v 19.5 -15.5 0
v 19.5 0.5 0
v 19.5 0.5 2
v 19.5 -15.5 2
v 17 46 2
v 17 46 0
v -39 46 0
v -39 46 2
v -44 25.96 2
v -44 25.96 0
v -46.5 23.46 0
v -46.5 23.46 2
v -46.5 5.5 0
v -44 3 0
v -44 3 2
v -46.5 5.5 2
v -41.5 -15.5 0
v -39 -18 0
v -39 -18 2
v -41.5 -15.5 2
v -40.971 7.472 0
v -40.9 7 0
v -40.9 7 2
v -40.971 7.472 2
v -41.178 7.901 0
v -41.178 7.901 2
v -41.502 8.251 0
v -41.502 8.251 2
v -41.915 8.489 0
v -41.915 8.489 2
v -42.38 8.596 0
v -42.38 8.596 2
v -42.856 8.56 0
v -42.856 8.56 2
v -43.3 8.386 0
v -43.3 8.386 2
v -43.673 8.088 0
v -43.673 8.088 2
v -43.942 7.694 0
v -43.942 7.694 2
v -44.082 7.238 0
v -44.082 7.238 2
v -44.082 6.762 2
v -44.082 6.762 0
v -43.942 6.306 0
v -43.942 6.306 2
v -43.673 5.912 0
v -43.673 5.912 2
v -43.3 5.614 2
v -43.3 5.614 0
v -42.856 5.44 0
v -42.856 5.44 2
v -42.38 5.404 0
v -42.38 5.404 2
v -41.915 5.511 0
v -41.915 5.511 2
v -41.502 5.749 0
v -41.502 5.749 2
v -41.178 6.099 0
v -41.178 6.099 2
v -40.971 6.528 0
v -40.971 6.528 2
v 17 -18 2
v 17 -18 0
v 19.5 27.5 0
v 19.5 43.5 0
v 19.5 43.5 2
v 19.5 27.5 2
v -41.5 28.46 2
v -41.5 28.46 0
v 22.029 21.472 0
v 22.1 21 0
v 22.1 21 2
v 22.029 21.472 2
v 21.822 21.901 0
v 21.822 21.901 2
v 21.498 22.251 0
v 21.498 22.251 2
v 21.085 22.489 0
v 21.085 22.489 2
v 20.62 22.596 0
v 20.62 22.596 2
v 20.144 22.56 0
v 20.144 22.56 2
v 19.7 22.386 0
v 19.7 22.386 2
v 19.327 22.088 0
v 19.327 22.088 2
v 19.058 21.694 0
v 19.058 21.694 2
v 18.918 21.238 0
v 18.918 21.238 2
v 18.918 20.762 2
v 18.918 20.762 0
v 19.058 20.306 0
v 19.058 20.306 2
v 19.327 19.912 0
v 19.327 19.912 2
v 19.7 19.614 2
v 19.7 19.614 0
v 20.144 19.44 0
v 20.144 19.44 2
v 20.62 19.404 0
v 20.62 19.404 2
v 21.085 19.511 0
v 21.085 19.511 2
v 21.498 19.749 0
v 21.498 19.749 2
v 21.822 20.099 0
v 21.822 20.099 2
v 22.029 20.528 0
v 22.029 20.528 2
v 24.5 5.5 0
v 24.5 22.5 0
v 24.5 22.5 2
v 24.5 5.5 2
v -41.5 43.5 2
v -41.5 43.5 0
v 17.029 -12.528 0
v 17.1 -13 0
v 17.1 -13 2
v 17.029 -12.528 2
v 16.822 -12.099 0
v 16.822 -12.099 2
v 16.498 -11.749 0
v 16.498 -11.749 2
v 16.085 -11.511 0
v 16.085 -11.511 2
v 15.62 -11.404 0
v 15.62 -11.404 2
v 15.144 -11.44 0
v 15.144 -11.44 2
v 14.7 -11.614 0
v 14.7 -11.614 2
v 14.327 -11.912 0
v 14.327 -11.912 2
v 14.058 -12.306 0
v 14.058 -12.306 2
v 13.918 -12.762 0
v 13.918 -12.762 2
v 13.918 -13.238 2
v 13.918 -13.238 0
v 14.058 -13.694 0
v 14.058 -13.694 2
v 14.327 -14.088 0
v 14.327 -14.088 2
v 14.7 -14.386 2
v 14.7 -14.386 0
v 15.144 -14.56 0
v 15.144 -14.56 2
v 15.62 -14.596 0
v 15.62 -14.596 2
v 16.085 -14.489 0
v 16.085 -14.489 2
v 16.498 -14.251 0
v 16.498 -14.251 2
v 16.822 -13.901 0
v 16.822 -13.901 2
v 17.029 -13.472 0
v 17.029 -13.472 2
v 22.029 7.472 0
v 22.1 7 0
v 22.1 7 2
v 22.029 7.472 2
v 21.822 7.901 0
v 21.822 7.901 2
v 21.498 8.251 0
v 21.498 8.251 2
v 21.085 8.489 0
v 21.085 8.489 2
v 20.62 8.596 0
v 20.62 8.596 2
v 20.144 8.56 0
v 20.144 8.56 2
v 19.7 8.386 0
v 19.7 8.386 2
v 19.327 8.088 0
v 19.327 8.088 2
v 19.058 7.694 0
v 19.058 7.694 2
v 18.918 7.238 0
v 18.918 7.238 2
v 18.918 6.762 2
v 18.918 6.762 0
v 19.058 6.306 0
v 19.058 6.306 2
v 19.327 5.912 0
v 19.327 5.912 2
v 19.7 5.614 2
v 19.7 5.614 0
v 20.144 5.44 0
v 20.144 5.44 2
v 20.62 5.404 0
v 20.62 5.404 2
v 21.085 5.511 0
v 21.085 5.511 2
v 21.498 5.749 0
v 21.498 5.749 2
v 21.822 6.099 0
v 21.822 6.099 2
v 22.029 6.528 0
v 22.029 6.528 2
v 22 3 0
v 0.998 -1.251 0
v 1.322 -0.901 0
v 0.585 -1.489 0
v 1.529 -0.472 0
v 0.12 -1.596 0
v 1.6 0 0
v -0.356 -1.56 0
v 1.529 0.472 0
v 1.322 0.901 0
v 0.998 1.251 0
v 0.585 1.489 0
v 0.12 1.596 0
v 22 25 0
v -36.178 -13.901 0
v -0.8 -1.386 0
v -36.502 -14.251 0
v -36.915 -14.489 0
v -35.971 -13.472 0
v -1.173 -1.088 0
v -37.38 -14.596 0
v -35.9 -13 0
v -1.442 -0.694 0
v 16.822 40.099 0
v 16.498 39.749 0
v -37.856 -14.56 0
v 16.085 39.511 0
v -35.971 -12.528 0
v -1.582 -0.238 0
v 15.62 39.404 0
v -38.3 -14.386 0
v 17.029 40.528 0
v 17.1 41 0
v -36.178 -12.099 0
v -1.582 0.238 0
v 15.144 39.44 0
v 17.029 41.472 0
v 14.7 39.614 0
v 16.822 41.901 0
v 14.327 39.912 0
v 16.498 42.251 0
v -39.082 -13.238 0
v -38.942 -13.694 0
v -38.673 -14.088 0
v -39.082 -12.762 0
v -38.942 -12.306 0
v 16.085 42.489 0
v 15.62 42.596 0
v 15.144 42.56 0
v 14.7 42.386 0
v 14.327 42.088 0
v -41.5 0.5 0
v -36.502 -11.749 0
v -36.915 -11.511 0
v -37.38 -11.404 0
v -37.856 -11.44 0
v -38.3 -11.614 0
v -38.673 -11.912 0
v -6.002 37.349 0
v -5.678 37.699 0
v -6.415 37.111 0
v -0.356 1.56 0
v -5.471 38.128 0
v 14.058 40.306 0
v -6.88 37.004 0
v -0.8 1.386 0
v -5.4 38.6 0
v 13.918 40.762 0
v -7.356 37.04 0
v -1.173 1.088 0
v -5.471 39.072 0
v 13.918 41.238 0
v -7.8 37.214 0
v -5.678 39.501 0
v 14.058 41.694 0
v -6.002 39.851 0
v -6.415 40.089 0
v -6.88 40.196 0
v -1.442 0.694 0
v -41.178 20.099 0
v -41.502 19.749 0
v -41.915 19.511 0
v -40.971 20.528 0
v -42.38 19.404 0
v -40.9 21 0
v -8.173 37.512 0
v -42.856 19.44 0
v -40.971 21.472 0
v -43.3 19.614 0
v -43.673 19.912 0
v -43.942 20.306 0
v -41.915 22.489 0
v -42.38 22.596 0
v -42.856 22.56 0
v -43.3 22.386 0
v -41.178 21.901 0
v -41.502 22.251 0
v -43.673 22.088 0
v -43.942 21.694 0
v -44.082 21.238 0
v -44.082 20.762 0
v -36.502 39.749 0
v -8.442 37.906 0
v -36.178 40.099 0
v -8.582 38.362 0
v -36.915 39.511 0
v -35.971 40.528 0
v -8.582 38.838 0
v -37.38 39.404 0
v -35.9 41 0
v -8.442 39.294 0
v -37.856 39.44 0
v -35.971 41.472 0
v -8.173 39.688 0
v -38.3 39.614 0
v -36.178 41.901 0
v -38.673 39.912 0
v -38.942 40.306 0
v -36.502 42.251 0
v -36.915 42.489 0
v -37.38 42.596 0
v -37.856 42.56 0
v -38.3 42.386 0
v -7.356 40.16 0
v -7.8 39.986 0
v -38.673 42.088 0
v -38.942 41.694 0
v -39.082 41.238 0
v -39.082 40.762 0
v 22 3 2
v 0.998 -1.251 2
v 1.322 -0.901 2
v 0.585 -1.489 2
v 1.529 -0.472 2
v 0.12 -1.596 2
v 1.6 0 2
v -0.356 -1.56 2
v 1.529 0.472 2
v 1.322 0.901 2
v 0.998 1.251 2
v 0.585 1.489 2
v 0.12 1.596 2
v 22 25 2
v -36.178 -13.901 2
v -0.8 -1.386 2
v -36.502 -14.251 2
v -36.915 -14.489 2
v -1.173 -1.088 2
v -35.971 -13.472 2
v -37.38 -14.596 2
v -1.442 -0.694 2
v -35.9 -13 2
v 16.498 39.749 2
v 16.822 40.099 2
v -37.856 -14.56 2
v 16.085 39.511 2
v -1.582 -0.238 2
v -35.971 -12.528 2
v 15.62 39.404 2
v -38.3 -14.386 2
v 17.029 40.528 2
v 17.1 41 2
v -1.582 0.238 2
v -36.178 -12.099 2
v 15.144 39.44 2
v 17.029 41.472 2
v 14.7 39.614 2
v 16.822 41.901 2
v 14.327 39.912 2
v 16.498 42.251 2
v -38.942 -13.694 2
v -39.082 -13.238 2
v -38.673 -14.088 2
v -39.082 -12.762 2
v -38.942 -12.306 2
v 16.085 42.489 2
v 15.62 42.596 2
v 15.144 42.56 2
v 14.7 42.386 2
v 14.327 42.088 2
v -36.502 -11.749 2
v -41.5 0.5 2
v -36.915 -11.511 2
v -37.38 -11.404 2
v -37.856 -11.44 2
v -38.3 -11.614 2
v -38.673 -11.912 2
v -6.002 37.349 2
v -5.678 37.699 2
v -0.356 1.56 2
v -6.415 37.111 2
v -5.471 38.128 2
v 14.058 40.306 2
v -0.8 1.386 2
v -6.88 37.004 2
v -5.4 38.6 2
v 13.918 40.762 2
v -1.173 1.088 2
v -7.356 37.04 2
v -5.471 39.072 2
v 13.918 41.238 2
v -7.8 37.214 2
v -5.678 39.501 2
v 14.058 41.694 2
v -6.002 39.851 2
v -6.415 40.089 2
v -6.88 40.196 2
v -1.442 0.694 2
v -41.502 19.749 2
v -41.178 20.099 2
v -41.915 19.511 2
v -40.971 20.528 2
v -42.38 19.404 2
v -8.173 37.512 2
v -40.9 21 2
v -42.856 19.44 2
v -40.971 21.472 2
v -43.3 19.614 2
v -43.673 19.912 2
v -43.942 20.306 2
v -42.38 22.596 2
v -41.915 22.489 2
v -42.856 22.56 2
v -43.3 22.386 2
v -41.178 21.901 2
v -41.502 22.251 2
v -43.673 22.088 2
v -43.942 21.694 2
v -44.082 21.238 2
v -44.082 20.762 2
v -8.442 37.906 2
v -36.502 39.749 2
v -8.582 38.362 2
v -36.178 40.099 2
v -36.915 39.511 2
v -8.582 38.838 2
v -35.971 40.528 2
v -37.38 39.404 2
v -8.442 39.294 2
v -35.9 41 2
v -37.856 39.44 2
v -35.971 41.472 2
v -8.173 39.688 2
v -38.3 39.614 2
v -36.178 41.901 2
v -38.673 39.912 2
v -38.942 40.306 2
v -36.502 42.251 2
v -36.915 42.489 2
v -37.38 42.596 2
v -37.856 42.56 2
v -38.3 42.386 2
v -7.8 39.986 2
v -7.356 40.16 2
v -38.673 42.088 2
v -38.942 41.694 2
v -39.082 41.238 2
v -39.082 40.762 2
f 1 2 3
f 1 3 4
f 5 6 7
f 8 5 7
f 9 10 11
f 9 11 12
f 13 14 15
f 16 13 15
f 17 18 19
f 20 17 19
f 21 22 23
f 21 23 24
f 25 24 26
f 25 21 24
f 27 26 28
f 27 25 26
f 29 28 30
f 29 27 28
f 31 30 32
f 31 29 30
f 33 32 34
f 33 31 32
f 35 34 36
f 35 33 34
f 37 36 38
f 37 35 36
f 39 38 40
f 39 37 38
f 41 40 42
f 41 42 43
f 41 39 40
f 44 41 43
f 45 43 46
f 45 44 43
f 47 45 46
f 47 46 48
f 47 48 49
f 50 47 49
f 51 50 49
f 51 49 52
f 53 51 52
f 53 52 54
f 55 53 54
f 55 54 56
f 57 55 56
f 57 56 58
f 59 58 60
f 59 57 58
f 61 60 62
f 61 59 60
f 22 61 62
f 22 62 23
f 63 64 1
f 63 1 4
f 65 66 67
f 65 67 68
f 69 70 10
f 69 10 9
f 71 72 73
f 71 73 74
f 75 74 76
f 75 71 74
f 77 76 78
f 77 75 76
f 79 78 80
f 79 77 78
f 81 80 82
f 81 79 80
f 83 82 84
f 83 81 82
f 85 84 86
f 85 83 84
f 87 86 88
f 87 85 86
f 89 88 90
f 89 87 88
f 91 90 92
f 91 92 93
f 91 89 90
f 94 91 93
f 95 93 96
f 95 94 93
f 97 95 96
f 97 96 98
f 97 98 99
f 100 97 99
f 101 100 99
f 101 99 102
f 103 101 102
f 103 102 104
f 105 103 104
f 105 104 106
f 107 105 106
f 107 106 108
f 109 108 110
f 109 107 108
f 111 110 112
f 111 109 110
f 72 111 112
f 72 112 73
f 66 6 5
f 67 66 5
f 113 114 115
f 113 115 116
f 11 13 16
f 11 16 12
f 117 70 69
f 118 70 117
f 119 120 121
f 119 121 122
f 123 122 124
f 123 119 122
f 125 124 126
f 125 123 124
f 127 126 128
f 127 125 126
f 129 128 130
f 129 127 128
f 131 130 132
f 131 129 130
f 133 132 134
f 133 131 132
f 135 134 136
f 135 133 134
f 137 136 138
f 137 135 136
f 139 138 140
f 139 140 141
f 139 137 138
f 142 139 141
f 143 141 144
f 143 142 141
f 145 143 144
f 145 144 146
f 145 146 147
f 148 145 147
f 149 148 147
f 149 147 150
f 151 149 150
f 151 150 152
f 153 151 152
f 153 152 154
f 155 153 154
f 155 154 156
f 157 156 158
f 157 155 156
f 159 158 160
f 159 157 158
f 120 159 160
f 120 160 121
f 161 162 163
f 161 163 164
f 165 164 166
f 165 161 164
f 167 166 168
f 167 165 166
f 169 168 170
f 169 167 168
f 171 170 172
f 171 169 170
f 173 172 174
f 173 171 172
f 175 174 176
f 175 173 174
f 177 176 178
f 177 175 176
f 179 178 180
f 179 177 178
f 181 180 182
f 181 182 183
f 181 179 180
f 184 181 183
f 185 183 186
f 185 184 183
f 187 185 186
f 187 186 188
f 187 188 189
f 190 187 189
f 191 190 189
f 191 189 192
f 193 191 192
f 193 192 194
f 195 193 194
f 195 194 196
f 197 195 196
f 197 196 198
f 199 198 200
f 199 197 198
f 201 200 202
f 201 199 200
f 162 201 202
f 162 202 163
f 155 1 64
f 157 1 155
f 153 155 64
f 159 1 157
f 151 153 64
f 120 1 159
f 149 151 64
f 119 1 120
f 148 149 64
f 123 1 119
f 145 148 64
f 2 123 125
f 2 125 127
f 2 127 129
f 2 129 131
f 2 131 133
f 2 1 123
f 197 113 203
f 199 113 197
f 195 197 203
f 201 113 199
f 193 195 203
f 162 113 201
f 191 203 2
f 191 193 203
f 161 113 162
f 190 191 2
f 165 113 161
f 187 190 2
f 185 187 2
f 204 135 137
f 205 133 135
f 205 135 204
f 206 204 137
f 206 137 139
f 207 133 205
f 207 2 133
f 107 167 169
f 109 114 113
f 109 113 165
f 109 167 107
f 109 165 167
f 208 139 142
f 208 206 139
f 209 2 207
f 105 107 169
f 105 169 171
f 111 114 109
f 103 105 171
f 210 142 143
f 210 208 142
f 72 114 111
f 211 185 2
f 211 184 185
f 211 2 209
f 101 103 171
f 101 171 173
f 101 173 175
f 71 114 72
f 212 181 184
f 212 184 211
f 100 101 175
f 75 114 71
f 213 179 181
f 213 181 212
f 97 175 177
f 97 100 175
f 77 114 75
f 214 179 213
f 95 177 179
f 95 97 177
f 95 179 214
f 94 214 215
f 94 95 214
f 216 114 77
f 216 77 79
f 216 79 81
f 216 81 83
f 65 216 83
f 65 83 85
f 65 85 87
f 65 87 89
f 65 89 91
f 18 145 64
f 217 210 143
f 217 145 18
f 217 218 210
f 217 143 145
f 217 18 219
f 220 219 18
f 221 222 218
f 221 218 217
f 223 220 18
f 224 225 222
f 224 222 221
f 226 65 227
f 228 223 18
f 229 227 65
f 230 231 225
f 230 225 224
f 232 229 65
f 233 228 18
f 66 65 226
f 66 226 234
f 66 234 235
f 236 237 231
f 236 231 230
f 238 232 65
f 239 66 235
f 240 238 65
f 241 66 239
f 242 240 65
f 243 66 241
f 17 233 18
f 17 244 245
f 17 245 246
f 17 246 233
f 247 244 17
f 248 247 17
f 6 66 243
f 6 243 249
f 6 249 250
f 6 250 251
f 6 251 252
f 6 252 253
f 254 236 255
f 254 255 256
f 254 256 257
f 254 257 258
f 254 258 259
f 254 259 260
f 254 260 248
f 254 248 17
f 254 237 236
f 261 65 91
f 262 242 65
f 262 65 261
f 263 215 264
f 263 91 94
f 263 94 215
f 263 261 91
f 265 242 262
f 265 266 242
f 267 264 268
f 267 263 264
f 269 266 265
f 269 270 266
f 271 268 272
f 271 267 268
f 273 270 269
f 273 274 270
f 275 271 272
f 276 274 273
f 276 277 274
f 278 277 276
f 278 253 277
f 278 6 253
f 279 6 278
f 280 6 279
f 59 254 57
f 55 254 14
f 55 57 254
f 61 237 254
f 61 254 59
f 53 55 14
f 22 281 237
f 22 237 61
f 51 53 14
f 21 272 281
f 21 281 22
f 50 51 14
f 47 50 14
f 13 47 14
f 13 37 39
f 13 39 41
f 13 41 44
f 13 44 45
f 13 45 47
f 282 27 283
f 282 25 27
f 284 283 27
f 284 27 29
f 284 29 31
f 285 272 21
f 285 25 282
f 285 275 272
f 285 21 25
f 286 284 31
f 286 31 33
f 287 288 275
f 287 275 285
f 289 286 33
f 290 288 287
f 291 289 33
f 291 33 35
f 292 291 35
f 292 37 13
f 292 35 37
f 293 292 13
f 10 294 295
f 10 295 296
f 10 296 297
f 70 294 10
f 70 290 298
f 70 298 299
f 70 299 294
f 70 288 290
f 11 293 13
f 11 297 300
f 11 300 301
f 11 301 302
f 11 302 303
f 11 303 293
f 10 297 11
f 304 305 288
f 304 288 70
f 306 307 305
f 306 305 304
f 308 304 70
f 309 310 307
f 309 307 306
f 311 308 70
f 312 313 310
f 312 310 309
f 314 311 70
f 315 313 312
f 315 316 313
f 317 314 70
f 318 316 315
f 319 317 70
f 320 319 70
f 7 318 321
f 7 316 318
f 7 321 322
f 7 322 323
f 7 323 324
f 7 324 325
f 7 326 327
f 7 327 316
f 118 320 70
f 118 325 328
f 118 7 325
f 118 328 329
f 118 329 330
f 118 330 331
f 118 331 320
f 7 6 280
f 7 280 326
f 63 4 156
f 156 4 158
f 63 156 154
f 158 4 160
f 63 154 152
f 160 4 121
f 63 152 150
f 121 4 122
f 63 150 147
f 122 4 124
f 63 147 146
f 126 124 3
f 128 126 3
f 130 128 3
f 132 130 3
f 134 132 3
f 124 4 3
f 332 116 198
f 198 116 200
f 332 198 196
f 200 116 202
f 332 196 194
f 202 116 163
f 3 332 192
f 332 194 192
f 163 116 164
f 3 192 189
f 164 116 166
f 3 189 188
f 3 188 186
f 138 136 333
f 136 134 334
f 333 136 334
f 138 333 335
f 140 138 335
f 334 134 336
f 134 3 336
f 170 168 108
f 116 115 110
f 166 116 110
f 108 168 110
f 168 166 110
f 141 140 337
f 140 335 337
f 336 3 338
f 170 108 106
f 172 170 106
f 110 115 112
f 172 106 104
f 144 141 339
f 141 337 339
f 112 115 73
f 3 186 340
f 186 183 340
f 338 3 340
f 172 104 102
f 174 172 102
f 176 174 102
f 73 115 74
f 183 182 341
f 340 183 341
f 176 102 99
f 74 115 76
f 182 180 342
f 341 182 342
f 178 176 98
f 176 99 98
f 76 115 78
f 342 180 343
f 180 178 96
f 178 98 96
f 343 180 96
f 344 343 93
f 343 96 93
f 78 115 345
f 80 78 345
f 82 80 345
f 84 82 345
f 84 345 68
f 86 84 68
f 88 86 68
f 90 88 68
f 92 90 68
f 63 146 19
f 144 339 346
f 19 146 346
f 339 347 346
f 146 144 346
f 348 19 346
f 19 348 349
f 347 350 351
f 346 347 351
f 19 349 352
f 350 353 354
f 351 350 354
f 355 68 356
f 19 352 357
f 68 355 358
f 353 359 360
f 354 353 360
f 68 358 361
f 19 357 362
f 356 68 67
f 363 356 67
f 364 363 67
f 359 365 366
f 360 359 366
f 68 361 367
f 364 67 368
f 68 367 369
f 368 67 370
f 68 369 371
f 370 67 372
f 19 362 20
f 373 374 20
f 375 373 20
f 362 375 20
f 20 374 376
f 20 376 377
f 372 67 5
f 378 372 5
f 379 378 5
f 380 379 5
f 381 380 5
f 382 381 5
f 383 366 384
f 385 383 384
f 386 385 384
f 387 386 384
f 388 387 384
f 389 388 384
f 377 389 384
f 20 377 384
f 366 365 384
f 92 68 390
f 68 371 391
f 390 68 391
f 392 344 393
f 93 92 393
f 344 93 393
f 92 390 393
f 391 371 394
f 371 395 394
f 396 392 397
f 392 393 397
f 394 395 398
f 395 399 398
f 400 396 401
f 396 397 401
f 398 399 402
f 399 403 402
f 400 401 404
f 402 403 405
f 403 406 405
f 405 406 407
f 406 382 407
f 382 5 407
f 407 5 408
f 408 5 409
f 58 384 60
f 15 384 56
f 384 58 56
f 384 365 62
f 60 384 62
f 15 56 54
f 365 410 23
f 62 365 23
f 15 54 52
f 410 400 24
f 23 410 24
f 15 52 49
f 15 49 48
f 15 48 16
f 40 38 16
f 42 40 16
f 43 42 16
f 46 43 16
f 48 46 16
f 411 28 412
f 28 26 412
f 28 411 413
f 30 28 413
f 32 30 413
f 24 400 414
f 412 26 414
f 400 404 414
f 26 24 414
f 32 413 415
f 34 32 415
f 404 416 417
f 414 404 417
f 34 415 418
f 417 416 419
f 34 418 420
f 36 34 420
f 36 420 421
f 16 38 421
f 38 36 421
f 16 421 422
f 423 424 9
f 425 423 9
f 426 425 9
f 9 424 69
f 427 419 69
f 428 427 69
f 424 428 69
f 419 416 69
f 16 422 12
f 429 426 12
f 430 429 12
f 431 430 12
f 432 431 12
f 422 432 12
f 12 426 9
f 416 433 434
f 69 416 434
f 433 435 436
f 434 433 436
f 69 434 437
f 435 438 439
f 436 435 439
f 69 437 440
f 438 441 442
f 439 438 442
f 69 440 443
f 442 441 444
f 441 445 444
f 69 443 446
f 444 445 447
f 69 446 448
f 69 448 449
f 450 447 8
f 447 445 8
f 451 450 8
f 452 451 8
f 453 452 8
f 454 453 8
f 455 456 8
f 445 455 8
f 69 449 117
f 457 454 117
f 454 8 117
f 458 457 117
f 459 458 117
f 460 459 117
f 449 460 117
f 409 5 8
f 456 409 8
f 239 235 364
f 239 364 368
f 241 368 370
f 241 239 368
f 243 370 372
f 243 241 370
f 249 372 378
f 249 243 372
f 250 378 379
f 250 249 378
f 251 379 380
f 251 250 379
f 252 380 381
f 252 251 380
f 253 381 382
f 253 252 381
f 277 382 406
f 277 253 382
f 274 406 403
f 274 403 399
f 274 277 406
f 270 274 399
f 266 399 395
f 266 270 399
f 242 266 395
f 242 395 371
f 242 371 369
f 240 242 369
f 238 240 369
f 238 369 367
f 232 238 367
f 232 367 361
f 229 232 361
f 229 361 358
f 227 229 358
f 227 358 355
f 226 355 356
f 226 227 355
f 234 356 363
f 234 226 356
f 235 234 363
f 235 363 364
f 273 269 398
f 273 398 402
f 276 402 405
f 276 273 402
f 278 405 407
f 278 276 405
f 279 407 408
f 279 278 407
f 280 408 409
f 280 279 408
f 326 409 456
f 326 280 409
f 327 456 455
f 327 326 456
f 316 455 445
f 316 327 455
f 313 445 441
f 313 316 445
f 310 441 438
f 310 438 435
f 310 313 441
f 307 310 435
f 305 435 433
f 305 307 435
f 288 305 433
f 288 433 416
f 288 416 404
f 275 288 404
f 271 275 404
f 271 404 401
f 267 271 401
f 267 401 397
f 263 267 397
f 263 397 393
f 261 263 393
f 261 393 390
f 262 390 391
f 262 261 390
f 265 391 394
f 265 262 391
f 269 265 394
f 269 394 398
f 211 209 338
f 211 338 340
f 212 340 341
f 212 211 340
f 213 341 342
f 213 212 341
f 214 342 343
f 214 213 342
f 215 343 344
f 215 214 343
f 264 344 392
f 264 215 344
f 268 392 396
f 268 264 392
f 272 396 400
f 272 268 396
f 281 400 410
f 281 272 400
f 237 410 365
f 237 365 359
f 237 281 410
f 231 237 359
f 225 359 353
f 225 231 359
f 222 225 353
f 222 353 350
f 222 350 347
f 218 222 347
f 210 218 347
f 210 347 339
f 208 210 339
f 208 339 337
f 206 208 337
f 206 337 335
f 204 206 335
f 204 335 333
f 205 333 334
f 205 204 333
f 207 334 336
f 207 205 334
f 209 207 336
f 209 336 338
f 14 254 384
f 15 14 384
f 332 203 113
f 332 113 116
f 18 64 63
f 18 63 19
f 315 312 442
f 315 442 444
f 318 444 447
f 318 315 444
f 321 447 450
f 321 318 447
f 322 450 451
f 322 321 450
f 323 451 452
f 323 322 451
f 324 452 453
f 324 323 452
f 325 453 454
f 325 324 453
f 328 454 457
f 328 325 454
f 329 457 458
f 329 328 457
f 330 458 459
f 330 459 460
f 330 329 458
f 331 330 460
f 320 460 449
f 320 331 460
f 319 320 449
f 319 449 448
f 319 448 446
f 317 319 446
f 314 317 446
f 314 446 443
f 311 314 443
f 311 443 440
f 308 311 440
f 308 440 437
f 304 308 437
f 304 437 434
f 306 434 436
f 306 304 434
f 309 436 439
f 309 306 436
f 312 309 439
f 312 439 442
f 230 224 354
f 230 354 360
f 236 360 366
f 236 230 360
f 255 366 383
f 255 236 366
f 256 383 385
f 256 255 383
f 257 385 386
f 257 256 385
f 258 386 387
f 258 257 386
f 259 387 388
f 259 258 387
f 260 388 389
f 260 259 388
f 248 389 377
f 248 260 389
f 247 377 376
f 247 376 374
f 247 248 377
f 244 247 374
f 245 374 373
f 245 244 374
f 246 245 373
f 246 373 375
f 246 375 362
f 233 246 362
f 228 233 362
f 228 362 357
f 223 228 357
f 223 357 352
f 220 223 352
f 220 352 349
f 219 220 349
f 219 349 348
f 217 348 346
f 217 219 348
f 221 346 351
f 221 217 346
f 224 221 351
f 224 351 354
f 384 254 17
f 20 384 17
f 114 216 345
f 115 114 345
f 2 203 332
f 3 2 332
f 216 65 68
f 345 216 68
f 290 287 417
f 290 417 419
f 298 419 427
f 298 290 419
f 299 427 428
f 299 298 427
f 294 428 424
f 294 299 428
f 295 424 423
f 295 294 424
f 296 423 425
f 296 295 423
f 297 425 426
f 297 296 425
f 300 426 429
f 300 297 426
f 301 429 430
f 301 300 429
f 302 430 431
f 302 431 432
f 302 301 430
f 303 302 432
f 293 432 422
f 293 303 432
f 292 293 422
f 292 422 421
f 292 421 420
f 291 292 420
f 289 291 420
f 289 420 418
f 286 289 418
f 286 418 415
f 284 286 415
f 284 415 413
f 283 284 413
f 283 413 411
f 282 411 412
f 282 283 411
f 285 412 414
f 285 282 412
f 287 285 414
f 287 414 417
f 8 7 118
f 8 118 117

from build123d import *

# Parameters (mm, degrees)
SKETCH_1_W      = 38
SKETCH_1_H      = 54
SKETCH_1_R      = 1.6
EXTRUDE_1_DEPTH = 2
SKETCH_4_R      = 1.6
EXTRUDE_2_DEPTH = 2
CHAMFER_1_SIZE  = 2.5


with BuildPart() as part:
    # 草图1 → 凸台-拉伸1 (new body)
    with BuildSketch(Plane.XY):
        with Locations((-11, 14)):
            Rectangle(SKETCH_1_W, SKETCH_1_H)
        Circle(SKETCH_1_R, mode=Mode.SUBTRACT)
        with Locations((-7, 38.6)):
            Circle(SKETCH_1_R, mode=Mode.SUBTRACT)
    extrude(amount=EXTRUDE_1_DEPTH)

    # 草图4 → 凸台-拉伸2 (add)
    with BuildSketch(Plane.XY):
        Polygon((-33.880035193, 46), (19.5, 46), (19.5, 25), (24.5, 25), (24.5, 3), (19.5, 3), (19.5, -18), (-41.5, -18), (-41.5, 2.119651453), (-41.5, 3), (-46.5, 3), (-46.5, 25.960072655), (-41.5, 25.960072655), (-41.5, 46), align=None)
        with Locations((-37.5, 41)):
            Circle(SKETCH_4_R, mode=Mode.SUBTRACT)
        with Locations((15.5, -13)):
            Circle(SKETCH_4_R, mode=Mode.SUBTRACT)
        with Locations((-37.5, -13)):
            Circle(SKETCH_4_R, mode=Mode.SUBTRACT)
        with Locations((15.5, 41)):
            Circle(SKETCH_4_R, mode=Mode.SUBTRACT)
        with Locations((-42.5, 21)):
            Circle(SKETCH_4_R, mode=Mode.SUBTRACT)
        with Locations((20.5, 7)):
            Circle(SKETCH_4_R, mode=Mode.SUBTRACT)
        with Locations((-42.5, 7)):
            Circle(SKETCH_4_R, mode=Mode.SUBTRACT)
        with Locations((20.5, 21)):
            Circle(SKETCH_4_R, mode=Mode.SUBTRACT)
        with Locations((-7, 38.6)):
            Circle(SKETCH_4_R, mode=Mode.SUBTRACT)
        Circle(SKETCH_4_R, mode=Mode.SUBTRACT)
    extrude(amount=EXTRUDE_2_DEPTH)

    # Chamfer 1
    chamfer_1_edges = [part.edges().sort_by_distance(p)[0] for p in [
        (19.5, -18, 1),
        (19.5, 3, 1),
        (24.5, 3, 1),
        (24.5, 25, 1),
        (19.5, 25, 1),
        (19.5, 46, 1),
        (-41.5, -18, 1),
        (-41.5, 3, 1),
        (-46.5, 3, 1),
        (-41.5, 25.960072655, 1),
        (-46.5, 25.960072655, 1),
        (-41.5, 46, 1),
    ]]
    chamfer(chamfer_1_edges, length=CHAMFER_1_SIZE - 0.0001)  # a hair under: the kernel refuses the full size


solid = part.part
